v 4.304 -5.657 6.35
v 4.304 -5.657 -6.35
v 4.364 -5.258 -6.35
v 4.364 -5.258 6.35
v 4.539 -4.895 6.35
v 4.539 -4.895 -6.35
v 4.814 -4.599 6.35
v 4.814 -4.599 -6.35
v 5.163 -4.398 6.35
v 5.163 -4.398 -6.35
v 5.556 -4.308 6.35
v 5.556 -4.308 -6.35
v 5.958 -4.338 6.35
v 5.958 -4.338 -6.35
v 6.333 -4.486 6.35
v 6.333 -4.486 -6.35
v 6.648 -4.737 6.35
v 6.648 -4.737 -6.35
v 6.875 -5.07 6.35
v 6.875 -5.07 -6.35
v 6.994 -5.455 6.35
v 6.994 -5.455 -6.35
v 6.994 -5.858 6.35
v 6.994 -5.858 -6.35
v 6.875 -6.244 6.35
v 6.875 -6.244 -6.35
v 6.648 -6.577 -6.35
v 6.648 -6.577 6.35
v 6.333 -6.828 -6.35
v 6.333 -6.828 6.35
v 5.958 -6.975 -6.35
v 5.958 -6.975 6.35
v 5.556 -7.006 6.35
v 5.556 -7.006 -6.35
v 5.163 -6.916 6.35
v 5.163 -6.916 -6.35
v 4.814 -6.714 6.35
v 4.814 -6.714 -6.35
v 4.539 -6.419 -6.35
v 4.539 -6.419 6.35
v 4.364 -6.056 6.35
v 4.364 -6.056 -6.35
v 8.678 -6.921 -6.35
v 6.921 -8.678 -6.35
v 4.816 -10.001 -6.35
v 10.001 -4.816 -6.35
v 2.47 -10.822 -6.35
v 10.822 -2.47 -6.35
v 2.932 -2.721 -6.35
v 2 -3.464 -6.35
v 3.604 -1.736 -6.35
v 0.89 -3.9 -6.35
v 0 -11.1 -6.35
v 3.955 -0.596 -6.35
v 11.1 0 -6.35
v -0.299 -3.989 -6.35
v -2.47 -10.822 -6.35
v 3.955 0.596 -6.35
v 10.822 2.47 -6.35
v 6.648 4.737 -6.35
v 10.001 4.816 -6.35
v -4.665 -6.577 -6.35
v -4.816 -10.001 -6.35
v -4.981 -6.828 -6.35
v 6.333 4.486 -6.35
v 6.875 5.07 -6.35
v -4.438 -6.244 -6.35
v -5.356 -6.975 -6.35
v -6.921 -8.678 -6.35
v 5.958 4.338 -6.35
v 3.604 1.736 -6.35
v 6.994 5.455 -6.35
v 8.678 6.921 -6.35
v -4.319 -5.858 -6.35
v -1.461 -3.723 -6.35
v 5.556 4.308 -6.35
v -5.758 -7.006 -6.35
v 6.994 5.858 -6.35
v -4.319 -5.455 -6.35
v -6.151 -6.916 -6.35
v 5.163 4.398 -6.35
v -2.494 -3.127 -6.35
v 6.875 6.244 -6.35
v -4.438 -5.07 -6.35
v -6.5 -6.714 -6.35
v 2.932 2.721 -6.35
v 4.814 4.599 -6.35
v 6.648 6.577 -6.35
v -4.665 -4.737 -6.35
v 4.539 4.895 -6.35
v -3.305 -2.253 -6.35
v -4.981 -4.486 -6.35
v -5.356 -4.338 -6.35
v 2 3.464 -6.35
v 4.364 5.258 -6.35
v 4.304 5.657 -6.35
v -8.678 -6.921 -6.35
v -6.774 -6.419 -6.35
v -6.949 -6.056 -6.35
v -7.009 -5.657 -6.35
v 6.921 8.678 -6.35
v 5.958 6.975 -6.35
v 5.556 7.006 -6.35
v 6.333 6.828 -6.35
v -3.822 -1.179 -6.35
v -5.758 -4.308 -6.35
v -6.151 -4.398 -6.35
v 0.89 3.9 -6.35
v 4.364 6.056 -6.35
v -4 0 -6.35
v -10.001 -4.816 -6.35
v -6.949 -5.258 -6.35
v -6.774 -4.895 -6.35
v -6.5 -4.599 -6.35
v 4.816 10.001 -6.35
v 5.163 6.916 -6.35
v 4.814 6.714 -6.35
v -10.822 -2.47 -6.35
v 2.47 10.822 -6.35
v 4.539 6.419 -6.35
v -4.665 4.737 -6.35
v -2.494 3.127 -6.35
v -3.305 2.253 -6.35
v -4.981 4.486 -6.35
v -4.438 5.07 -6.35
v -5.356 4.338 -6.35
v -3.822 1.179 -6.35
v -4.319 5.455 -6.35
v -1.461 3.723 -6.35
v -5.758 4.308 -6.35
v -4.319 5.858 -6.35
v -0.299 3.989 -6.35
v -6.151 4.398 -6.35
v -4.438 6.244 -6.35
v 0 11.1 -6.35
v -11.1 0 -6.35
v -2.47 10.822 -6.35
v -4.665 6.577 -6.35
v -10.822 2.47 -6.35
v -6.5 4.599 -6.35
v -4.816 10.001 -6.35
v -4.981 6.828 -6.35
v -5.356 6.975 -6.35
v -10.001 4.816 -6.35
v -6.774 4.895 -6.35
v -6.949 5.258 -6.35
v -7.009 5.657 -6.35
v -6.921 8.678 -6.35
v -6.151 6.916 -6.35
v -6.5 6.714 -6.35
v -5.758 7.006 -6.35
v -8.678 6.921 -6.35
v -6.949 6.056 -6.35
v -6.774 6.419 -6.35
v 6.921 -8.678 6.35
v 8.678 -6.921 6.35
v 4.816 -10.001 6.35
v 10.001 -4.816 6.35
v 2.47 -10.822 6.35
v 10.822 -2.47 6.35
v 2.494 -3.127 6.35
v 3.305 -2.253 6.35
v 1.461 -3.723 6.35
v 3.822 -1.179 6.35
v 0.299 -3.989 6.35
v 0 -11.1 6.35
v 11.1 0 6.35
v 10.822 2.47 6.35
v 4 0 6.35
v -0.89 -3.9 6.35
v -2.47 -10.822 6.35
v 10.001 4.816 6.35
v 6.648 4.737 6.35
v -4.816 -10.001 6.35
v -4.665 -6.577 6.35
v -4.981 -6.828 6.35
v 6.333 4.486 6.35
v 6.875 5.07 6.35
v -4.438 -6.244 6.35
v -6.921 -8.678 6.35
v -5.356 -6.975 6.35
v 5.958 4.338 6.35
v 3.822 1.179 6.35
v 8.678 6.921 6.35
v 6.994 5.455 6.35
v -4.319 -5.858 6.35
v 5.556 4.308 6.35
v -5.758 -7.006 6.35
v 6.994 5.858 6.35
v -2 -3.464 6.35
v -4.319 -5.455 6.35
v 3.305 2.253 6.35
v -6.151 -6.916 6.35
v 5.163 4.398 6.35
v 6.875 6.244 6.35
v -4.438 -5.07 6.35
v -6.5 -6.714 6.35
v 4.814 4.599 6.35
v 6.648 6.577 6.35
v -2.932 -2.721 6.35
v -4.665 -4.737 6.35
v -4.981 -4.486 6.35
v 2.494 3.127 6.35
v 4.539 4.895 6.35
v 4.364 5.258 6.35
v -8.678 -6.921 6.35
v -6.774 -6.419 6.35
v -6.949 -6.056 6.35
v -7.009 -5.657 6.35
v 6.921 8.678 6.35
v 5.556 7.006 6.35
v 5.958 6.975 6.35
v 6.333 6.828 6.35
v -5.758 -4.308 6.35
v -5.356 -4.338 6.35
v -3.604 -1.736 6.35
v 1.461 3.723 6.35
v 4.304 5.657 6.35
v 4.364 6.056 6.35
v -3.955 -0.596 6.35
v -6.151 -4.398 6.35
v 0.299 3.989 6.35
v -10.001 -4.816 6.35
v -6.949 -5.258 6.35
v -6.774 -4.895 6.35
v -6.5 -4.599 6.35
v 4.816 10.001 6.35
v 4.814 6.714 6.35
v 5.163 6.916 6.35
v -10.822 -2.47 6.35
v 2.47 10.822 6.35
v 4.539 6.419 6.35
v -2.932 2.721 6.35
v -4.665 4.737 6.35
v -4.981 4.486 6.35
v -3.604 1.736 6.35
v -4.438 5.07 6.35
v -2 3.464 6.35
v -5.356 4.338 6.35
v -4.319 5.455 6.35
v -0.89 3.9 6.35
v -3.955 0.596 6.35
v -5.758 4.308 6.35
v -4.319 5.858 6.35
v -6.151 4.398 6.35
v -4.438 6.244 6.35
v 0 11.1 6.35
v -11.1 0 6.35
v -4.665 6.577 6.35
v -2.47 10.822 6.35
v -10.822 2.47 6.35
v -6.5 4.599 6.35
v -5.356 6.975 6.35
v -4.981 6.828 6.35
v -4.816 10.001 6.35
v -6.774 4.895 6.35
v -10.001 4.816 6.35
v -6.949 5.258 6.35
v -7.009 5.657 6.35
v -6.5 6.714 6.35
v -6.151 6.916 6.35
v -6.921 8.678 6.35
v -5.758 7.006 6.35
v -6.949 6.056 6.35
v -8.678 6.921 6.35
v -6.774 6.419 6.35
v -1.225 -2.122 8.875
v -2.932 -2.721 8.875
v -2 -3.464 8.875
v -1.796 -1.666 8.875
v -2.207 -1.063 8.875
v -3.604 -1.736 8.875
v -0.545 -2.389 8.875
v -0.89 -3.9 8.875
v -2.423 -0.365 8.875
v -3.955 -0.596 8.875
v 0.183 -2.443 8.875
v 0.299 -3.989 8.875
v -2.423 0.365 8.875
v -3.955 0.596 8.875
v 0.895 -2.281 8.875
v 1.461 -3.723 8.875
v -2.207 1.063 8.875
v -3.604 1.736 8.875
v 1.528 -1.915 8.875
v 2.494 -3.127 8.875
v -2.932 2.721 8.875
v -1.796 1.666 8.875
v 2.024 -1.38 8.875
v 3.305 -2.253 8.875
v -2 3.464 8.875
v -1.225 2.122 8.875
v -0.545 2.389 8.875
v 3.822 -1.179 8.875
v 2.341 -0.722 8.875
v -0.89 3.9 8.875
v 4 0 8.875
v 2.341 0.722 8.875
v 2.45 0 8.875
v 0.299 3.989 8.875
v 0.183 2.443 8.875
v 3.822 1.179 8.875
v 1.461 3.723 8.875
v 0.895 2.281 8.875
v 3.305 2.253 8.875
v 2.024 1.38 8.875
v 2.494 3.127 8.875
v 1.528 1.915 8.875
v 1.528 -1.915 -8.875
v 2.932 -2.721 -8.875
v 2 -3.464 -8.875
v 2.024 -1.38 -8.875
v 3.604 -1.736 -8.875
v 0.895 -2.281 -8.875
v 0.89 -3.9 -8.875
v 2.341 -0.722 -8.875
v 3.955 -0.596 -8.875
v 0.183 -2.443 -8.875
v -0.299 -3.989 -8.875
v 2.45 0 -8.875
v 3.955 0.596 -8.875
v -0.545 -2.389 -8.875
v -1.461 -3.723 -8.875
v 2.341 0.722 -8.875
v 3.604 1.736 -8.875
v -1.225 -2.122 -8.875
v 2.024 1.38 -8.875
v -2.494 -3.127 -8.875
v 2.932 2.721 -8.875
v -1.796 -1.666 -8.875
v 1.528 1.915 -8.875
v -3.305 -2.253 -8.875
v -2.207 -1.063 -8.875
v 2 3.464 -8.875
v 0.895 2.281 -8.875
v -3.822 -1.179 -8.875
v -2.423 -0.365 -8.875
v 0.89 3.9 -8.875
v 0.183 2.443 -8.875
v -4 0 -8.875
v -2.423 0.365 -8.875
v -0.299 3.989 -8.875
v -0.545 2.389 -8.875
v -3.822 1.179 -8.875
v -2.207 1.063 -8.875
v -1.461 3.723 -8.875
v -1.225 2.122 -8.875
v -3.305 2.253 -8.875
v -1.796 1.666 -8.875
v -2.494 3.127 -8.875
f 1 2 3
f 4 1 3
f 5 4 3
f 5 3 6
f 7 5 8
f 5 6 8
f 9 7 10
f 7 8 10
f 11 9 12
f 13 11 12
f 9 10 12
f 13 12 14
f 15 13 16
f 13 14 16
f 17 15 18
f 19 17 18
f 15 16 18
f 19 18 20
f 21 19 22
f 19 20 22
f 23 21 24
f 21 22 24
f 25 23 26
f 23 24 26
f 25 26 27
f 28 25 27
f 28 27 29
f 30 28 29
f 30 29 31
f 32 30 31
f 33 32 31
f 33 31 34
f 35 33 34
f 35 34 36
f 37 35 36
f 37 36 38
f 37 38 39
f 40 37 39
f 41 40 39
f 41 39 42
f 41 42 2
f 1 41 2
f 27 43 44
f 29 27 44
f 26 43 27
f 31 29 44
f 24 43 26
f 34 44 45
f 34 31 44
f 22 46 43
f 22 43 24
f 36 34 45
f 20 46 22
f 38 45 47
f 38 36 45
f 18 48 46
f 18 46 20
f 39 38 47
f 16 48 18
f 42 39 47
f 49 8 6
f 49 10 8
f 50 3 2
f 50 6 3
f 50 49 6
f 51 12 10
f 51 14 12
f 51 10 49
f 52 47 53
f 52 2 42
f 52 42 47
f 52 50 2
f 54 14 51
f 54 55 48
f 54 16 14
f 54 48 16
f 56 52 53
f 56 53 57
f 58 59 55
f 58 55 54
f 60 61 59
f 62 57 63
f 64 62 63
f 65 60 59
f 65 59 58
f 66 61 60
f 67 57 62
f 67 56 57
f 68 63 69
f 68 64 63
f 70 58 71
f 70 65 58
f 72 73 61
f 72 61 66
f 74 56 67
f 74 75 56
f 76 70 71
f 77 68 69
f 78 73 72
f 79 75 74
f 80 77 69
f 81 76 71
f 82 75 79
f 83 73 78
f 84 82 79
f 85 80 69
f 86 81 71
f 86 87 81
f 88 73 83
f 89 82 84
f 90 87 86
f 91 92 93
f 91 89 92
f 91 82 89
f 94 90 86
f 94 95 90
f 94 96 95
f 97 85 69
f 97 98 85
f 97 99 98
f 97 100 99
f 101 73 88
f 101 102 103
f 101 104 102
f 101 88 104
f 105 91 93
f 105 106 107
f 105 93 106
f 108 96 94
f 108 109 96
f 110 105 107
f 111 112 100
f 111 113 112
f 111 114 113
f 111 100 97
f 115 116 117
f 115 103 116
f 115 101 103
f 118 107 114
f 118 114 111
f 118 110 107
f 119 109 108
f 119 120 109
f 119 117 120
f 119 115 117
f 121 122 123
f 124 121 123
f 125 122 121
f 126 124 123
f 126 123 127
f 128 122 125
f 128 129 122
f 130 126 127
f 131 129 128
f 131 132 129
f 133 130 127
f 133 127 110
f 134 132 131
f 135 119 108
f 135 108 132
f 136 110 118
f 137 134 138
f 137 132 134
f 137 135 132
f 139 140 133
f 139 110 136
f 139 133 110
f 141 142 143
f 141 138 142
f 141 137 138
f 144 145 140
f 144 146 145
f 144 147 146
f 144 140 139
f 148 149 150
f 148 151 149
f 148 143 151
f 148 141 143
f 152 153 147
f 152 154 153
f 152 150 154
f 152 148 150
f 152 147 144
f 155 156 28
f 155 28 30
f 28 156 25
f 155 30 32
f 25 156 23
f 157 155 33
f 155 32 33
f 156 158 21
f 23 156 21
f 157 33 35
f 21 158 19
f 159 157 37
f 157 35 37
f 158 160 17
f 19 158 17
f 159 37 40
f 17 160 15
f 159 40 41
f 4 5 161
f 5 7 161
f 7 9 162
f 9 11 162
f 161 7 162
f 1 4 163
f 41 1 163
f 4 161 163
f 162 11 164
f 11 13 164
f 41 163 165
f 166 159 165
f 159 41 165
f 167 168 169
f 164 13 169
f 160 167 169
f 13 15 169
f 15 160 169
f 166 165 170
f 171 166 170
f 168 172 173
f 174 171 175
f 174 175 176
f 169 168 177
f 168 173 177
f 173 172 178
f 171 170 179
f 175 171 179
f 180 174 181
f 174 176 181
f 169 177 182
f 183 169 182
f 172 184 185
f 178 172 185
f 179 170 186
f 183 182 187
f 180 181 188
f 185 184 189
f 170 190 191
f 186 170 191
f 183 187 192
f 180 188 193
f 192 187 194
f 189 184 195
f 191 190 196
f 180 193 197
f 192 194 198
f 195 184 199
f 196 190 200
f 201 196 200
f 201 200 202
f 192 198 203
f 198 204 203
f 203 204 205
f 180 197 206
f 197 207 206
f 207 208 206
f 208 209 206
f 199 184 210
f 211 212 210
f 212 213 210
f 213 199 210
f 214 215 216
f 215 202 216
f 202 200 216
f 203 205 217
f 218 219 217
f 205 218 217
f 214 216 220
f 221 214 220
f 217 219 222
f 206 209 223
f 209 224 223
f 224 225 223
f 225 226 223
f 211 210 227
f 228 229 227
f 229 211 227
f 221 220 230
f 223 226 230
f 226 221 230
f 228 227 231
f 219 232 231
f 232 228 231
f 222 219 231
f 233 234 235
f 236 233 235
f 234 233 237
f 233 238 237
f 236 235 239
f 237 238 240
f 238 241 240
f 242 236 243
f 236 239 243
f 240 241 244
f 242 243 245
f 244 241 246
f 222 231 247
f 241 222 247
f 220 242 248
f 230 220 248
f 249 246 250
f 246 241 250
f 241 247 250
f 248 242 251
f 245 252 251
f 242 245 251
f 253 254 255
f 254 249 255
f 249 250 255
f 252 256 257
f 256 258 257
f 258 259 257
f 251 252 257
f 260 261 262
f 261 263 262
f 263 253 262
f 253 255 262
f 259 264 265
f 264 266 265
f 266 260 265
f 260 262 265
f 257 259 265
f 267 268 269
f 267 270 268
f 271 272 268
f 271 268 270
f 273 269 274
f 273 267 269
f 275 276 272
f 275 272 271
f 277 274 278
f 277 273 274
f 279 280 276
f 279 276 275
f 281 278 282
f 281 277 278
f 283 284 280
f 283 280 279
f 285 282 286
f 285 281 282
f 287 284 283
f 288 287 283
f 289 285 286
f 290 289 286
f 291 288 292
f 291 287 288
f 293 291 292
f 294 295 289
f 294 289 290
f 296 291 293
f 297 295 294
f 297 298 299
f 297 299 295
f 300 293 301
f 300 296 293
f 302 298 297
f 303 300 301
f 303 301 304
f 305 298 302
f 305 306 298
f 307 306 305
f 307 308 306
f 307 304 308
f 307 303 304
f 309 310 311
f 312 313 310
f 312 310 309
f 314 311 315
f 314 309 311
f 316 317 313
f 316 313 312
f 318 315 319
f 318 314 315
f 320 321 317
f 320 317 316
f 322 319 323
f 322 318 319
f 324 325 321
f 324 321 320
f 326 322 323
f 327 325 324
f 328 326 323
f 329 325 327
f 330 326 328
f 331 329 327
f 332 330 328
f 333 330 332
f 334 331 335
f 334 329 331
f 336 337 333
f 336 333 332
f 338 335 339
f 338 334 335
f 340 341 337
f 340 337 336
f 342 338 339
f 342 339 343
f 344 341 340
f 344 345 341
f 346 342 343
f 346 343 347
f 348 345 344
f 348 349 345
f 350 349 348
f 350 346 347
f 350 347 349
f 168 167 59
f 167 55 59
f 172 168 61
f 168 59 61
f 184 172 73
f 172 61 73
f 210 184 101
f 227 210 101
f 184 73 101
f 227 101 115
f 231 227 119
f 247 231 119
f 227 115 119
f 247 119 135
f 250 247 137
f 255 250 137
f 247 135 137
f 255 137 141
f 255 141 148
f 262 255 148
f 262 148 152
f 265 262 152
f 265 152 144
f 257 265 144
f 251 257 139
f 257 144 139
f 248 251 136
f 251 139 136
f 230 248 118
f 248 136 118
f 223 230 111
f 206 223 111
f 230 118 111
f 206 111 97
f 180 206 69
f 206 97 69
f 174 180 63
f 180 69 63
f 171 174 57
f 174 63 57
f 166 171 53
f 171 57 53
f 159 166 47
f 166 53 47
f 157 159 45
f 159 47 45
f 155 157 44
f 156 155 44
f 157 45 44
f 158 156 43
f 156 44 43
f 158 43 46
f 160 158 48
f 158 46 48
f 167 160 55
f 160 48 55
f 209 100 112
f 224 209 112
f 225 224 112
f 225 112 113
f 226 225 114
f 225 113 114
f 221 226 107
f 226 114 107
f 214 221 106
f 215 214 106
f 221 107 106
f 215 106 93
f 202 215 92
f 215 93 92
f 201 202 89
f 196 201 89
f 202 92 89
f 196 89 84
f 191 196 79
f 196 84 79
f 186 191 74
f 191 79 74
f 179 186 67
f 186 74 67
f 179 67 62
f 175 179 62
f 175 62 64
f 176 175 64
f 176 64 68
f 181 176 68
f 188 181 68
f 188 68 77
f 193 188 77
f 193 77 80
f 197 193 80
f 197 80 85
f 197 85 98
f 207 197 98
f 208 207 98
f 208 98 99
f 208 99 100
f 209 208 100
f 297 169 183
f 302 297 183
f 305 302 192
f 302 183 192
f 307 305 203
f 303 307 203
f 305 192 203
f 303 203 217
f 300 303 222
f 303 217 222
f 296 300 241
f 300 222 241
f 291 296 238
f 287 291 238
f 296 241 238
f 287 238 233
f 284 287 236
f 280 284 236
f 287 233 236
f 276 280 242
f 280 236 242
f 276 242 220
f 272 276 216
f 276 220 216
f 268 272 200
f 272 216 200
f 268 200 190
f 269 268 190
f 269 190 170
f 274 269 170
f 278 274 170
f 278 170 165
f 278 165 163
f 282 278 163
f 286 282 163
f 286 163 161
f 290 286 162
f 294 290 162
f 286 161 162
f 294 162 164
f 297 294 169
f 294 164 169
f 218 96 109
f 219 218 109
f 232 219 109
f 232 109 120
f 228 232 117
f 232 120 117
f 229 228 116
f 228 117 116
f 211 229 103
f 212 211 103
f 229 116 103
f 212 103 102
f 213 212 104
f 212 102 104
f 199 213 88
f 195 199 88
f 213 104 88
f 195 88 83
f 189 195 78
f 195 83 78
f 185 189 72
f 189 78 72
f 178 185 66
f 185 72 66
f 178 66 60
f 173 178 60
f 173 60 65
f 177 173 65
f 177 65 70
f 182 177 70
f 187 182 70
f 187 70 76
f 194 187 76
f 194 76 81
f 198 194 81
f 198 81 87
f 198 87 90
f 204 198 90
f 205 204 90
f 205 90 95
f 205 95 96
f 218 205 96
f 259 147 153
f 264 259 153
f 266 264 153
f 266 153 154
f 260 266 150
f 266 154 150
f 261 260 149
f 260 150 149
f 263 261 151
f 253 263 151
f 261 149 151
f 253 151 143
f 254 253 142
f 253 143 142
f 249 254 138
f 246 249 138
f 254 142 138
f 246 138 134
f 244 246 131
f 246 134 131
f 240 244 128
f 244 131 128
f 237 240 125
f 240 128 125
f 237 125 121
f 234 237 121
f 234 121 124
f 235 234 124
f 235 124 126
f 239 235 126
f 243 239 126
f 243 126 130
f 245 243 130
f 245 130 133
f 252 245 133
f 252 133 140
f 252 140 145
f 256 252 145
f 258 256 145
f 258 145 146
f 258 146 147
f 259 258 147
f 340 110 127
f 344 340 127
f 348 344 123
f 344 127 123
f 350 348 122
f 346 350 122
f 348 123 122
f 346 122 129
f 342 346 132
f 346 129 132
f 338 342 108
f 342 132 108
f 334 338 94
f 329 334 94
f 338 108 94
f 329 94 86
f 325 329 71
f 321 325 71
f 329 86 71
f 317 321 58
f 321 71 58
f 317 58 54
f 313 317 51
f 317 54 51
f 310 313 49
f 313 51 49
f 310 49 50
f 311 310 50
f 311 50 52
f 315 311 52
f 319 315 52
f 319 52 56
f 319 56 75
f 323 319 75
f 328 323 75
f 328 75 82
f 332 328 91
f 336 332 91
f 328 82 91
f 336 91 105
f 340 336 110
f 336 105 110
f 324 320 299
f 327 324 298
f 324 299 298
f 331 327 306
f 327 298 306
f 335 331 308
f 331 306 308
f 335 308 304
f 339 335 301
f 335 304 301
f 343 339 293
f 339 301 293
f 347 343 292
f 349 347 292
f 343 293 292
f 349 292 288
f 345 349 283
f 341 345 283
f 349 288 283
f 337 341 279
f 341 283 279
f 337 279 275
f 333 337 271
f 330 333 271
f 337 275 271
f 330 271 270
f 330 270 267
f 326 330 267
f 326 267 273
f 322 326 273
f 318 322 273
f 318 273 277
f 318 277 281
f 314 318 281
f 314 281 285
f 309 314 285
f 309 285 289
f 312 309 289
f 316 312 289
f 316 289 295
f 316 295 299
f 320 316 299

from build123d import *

# Parameters (mm, degrees)
SKETCH1_W                      = 11.1
SKETCH1_H                      = 12.7
SKETCH2_R                      = 4
BOSS_EXTRUDE1_DEPTH            = 2.525
SKETCH3_R                      = 4
BOSS_EXTRUDE2_DEPTH            = 2.525
M2_5_CLEARANCE_HOLE1_D         = 2.705
M2_5_CLEARANCE_HOLE1_DEPTH     = 15.225
F_4_9_4_9_DIAMETER_HOLE1_D     = 4.9
F_4_9_4_9_DIAMETER_HOLE1_DEPTH = 17.75


with BuildPart() as part:
    # Sketch1 → Revolve1 (revolve)
    with BuildSketch(Plane(origin=(0, 0, 0), x_dir=(1, 0, 0), z_dir=(0, 1, 0))):
        with Locations((5.55, 0)):
            Rectangle(SKETCH1_W, SKETCH1_H)
    revolve(axis=Axis((0, 0, -6.35), (0, 0, 1)))

    # Sketch2 → Boss-Extrude1 (add)
    with BuildSketch(Plane(origin=(0, 0, -6.35), x_dir=(-1, 0, 0), z_dir=(0, 0, -1))):
        Circle(SKETCH2_R)
    extrude(amount=BOSS_EXTRUDE1_DEPTH)

    # Sketch3 → Boss-Extrude2 (add)
    with BuildSketch(Plane.XY.offset(6.35)):
        Circle(SKETCH3_R)
    extrude(amount=BOSS_EXTRUDE2_DEPTH)

    # M2.5 Clearance Hole1
    with Locations(Plane.XY.offset(6.35)):
        with Locations((5.656854249, 5.656854249), (-5.656854249, 5.656854249), (-5.656854249, -5.656854249), (5.656854249, -5.656854249)):
            Hole(M2_5_CLEARANCE_HOLE1_D / 2, depth=M2_5_CLEARANCE_HOLE1_DEPTH)

    # Ø4.9 (4.9) Diameter Hole1
    with Locations(Plane(origin=(0, 0, -8.875), x_dir=(-1, 0, 0), z_dir=(0, 0, -1))):
        with Locations((0, 0)):
            Hole(F_4_9_4_9_DIAMETER_HOLE1_D / 2, depth=F_4_9_4_9_DIAMETER_HOLE1_DEPTH)


solid = part.part
